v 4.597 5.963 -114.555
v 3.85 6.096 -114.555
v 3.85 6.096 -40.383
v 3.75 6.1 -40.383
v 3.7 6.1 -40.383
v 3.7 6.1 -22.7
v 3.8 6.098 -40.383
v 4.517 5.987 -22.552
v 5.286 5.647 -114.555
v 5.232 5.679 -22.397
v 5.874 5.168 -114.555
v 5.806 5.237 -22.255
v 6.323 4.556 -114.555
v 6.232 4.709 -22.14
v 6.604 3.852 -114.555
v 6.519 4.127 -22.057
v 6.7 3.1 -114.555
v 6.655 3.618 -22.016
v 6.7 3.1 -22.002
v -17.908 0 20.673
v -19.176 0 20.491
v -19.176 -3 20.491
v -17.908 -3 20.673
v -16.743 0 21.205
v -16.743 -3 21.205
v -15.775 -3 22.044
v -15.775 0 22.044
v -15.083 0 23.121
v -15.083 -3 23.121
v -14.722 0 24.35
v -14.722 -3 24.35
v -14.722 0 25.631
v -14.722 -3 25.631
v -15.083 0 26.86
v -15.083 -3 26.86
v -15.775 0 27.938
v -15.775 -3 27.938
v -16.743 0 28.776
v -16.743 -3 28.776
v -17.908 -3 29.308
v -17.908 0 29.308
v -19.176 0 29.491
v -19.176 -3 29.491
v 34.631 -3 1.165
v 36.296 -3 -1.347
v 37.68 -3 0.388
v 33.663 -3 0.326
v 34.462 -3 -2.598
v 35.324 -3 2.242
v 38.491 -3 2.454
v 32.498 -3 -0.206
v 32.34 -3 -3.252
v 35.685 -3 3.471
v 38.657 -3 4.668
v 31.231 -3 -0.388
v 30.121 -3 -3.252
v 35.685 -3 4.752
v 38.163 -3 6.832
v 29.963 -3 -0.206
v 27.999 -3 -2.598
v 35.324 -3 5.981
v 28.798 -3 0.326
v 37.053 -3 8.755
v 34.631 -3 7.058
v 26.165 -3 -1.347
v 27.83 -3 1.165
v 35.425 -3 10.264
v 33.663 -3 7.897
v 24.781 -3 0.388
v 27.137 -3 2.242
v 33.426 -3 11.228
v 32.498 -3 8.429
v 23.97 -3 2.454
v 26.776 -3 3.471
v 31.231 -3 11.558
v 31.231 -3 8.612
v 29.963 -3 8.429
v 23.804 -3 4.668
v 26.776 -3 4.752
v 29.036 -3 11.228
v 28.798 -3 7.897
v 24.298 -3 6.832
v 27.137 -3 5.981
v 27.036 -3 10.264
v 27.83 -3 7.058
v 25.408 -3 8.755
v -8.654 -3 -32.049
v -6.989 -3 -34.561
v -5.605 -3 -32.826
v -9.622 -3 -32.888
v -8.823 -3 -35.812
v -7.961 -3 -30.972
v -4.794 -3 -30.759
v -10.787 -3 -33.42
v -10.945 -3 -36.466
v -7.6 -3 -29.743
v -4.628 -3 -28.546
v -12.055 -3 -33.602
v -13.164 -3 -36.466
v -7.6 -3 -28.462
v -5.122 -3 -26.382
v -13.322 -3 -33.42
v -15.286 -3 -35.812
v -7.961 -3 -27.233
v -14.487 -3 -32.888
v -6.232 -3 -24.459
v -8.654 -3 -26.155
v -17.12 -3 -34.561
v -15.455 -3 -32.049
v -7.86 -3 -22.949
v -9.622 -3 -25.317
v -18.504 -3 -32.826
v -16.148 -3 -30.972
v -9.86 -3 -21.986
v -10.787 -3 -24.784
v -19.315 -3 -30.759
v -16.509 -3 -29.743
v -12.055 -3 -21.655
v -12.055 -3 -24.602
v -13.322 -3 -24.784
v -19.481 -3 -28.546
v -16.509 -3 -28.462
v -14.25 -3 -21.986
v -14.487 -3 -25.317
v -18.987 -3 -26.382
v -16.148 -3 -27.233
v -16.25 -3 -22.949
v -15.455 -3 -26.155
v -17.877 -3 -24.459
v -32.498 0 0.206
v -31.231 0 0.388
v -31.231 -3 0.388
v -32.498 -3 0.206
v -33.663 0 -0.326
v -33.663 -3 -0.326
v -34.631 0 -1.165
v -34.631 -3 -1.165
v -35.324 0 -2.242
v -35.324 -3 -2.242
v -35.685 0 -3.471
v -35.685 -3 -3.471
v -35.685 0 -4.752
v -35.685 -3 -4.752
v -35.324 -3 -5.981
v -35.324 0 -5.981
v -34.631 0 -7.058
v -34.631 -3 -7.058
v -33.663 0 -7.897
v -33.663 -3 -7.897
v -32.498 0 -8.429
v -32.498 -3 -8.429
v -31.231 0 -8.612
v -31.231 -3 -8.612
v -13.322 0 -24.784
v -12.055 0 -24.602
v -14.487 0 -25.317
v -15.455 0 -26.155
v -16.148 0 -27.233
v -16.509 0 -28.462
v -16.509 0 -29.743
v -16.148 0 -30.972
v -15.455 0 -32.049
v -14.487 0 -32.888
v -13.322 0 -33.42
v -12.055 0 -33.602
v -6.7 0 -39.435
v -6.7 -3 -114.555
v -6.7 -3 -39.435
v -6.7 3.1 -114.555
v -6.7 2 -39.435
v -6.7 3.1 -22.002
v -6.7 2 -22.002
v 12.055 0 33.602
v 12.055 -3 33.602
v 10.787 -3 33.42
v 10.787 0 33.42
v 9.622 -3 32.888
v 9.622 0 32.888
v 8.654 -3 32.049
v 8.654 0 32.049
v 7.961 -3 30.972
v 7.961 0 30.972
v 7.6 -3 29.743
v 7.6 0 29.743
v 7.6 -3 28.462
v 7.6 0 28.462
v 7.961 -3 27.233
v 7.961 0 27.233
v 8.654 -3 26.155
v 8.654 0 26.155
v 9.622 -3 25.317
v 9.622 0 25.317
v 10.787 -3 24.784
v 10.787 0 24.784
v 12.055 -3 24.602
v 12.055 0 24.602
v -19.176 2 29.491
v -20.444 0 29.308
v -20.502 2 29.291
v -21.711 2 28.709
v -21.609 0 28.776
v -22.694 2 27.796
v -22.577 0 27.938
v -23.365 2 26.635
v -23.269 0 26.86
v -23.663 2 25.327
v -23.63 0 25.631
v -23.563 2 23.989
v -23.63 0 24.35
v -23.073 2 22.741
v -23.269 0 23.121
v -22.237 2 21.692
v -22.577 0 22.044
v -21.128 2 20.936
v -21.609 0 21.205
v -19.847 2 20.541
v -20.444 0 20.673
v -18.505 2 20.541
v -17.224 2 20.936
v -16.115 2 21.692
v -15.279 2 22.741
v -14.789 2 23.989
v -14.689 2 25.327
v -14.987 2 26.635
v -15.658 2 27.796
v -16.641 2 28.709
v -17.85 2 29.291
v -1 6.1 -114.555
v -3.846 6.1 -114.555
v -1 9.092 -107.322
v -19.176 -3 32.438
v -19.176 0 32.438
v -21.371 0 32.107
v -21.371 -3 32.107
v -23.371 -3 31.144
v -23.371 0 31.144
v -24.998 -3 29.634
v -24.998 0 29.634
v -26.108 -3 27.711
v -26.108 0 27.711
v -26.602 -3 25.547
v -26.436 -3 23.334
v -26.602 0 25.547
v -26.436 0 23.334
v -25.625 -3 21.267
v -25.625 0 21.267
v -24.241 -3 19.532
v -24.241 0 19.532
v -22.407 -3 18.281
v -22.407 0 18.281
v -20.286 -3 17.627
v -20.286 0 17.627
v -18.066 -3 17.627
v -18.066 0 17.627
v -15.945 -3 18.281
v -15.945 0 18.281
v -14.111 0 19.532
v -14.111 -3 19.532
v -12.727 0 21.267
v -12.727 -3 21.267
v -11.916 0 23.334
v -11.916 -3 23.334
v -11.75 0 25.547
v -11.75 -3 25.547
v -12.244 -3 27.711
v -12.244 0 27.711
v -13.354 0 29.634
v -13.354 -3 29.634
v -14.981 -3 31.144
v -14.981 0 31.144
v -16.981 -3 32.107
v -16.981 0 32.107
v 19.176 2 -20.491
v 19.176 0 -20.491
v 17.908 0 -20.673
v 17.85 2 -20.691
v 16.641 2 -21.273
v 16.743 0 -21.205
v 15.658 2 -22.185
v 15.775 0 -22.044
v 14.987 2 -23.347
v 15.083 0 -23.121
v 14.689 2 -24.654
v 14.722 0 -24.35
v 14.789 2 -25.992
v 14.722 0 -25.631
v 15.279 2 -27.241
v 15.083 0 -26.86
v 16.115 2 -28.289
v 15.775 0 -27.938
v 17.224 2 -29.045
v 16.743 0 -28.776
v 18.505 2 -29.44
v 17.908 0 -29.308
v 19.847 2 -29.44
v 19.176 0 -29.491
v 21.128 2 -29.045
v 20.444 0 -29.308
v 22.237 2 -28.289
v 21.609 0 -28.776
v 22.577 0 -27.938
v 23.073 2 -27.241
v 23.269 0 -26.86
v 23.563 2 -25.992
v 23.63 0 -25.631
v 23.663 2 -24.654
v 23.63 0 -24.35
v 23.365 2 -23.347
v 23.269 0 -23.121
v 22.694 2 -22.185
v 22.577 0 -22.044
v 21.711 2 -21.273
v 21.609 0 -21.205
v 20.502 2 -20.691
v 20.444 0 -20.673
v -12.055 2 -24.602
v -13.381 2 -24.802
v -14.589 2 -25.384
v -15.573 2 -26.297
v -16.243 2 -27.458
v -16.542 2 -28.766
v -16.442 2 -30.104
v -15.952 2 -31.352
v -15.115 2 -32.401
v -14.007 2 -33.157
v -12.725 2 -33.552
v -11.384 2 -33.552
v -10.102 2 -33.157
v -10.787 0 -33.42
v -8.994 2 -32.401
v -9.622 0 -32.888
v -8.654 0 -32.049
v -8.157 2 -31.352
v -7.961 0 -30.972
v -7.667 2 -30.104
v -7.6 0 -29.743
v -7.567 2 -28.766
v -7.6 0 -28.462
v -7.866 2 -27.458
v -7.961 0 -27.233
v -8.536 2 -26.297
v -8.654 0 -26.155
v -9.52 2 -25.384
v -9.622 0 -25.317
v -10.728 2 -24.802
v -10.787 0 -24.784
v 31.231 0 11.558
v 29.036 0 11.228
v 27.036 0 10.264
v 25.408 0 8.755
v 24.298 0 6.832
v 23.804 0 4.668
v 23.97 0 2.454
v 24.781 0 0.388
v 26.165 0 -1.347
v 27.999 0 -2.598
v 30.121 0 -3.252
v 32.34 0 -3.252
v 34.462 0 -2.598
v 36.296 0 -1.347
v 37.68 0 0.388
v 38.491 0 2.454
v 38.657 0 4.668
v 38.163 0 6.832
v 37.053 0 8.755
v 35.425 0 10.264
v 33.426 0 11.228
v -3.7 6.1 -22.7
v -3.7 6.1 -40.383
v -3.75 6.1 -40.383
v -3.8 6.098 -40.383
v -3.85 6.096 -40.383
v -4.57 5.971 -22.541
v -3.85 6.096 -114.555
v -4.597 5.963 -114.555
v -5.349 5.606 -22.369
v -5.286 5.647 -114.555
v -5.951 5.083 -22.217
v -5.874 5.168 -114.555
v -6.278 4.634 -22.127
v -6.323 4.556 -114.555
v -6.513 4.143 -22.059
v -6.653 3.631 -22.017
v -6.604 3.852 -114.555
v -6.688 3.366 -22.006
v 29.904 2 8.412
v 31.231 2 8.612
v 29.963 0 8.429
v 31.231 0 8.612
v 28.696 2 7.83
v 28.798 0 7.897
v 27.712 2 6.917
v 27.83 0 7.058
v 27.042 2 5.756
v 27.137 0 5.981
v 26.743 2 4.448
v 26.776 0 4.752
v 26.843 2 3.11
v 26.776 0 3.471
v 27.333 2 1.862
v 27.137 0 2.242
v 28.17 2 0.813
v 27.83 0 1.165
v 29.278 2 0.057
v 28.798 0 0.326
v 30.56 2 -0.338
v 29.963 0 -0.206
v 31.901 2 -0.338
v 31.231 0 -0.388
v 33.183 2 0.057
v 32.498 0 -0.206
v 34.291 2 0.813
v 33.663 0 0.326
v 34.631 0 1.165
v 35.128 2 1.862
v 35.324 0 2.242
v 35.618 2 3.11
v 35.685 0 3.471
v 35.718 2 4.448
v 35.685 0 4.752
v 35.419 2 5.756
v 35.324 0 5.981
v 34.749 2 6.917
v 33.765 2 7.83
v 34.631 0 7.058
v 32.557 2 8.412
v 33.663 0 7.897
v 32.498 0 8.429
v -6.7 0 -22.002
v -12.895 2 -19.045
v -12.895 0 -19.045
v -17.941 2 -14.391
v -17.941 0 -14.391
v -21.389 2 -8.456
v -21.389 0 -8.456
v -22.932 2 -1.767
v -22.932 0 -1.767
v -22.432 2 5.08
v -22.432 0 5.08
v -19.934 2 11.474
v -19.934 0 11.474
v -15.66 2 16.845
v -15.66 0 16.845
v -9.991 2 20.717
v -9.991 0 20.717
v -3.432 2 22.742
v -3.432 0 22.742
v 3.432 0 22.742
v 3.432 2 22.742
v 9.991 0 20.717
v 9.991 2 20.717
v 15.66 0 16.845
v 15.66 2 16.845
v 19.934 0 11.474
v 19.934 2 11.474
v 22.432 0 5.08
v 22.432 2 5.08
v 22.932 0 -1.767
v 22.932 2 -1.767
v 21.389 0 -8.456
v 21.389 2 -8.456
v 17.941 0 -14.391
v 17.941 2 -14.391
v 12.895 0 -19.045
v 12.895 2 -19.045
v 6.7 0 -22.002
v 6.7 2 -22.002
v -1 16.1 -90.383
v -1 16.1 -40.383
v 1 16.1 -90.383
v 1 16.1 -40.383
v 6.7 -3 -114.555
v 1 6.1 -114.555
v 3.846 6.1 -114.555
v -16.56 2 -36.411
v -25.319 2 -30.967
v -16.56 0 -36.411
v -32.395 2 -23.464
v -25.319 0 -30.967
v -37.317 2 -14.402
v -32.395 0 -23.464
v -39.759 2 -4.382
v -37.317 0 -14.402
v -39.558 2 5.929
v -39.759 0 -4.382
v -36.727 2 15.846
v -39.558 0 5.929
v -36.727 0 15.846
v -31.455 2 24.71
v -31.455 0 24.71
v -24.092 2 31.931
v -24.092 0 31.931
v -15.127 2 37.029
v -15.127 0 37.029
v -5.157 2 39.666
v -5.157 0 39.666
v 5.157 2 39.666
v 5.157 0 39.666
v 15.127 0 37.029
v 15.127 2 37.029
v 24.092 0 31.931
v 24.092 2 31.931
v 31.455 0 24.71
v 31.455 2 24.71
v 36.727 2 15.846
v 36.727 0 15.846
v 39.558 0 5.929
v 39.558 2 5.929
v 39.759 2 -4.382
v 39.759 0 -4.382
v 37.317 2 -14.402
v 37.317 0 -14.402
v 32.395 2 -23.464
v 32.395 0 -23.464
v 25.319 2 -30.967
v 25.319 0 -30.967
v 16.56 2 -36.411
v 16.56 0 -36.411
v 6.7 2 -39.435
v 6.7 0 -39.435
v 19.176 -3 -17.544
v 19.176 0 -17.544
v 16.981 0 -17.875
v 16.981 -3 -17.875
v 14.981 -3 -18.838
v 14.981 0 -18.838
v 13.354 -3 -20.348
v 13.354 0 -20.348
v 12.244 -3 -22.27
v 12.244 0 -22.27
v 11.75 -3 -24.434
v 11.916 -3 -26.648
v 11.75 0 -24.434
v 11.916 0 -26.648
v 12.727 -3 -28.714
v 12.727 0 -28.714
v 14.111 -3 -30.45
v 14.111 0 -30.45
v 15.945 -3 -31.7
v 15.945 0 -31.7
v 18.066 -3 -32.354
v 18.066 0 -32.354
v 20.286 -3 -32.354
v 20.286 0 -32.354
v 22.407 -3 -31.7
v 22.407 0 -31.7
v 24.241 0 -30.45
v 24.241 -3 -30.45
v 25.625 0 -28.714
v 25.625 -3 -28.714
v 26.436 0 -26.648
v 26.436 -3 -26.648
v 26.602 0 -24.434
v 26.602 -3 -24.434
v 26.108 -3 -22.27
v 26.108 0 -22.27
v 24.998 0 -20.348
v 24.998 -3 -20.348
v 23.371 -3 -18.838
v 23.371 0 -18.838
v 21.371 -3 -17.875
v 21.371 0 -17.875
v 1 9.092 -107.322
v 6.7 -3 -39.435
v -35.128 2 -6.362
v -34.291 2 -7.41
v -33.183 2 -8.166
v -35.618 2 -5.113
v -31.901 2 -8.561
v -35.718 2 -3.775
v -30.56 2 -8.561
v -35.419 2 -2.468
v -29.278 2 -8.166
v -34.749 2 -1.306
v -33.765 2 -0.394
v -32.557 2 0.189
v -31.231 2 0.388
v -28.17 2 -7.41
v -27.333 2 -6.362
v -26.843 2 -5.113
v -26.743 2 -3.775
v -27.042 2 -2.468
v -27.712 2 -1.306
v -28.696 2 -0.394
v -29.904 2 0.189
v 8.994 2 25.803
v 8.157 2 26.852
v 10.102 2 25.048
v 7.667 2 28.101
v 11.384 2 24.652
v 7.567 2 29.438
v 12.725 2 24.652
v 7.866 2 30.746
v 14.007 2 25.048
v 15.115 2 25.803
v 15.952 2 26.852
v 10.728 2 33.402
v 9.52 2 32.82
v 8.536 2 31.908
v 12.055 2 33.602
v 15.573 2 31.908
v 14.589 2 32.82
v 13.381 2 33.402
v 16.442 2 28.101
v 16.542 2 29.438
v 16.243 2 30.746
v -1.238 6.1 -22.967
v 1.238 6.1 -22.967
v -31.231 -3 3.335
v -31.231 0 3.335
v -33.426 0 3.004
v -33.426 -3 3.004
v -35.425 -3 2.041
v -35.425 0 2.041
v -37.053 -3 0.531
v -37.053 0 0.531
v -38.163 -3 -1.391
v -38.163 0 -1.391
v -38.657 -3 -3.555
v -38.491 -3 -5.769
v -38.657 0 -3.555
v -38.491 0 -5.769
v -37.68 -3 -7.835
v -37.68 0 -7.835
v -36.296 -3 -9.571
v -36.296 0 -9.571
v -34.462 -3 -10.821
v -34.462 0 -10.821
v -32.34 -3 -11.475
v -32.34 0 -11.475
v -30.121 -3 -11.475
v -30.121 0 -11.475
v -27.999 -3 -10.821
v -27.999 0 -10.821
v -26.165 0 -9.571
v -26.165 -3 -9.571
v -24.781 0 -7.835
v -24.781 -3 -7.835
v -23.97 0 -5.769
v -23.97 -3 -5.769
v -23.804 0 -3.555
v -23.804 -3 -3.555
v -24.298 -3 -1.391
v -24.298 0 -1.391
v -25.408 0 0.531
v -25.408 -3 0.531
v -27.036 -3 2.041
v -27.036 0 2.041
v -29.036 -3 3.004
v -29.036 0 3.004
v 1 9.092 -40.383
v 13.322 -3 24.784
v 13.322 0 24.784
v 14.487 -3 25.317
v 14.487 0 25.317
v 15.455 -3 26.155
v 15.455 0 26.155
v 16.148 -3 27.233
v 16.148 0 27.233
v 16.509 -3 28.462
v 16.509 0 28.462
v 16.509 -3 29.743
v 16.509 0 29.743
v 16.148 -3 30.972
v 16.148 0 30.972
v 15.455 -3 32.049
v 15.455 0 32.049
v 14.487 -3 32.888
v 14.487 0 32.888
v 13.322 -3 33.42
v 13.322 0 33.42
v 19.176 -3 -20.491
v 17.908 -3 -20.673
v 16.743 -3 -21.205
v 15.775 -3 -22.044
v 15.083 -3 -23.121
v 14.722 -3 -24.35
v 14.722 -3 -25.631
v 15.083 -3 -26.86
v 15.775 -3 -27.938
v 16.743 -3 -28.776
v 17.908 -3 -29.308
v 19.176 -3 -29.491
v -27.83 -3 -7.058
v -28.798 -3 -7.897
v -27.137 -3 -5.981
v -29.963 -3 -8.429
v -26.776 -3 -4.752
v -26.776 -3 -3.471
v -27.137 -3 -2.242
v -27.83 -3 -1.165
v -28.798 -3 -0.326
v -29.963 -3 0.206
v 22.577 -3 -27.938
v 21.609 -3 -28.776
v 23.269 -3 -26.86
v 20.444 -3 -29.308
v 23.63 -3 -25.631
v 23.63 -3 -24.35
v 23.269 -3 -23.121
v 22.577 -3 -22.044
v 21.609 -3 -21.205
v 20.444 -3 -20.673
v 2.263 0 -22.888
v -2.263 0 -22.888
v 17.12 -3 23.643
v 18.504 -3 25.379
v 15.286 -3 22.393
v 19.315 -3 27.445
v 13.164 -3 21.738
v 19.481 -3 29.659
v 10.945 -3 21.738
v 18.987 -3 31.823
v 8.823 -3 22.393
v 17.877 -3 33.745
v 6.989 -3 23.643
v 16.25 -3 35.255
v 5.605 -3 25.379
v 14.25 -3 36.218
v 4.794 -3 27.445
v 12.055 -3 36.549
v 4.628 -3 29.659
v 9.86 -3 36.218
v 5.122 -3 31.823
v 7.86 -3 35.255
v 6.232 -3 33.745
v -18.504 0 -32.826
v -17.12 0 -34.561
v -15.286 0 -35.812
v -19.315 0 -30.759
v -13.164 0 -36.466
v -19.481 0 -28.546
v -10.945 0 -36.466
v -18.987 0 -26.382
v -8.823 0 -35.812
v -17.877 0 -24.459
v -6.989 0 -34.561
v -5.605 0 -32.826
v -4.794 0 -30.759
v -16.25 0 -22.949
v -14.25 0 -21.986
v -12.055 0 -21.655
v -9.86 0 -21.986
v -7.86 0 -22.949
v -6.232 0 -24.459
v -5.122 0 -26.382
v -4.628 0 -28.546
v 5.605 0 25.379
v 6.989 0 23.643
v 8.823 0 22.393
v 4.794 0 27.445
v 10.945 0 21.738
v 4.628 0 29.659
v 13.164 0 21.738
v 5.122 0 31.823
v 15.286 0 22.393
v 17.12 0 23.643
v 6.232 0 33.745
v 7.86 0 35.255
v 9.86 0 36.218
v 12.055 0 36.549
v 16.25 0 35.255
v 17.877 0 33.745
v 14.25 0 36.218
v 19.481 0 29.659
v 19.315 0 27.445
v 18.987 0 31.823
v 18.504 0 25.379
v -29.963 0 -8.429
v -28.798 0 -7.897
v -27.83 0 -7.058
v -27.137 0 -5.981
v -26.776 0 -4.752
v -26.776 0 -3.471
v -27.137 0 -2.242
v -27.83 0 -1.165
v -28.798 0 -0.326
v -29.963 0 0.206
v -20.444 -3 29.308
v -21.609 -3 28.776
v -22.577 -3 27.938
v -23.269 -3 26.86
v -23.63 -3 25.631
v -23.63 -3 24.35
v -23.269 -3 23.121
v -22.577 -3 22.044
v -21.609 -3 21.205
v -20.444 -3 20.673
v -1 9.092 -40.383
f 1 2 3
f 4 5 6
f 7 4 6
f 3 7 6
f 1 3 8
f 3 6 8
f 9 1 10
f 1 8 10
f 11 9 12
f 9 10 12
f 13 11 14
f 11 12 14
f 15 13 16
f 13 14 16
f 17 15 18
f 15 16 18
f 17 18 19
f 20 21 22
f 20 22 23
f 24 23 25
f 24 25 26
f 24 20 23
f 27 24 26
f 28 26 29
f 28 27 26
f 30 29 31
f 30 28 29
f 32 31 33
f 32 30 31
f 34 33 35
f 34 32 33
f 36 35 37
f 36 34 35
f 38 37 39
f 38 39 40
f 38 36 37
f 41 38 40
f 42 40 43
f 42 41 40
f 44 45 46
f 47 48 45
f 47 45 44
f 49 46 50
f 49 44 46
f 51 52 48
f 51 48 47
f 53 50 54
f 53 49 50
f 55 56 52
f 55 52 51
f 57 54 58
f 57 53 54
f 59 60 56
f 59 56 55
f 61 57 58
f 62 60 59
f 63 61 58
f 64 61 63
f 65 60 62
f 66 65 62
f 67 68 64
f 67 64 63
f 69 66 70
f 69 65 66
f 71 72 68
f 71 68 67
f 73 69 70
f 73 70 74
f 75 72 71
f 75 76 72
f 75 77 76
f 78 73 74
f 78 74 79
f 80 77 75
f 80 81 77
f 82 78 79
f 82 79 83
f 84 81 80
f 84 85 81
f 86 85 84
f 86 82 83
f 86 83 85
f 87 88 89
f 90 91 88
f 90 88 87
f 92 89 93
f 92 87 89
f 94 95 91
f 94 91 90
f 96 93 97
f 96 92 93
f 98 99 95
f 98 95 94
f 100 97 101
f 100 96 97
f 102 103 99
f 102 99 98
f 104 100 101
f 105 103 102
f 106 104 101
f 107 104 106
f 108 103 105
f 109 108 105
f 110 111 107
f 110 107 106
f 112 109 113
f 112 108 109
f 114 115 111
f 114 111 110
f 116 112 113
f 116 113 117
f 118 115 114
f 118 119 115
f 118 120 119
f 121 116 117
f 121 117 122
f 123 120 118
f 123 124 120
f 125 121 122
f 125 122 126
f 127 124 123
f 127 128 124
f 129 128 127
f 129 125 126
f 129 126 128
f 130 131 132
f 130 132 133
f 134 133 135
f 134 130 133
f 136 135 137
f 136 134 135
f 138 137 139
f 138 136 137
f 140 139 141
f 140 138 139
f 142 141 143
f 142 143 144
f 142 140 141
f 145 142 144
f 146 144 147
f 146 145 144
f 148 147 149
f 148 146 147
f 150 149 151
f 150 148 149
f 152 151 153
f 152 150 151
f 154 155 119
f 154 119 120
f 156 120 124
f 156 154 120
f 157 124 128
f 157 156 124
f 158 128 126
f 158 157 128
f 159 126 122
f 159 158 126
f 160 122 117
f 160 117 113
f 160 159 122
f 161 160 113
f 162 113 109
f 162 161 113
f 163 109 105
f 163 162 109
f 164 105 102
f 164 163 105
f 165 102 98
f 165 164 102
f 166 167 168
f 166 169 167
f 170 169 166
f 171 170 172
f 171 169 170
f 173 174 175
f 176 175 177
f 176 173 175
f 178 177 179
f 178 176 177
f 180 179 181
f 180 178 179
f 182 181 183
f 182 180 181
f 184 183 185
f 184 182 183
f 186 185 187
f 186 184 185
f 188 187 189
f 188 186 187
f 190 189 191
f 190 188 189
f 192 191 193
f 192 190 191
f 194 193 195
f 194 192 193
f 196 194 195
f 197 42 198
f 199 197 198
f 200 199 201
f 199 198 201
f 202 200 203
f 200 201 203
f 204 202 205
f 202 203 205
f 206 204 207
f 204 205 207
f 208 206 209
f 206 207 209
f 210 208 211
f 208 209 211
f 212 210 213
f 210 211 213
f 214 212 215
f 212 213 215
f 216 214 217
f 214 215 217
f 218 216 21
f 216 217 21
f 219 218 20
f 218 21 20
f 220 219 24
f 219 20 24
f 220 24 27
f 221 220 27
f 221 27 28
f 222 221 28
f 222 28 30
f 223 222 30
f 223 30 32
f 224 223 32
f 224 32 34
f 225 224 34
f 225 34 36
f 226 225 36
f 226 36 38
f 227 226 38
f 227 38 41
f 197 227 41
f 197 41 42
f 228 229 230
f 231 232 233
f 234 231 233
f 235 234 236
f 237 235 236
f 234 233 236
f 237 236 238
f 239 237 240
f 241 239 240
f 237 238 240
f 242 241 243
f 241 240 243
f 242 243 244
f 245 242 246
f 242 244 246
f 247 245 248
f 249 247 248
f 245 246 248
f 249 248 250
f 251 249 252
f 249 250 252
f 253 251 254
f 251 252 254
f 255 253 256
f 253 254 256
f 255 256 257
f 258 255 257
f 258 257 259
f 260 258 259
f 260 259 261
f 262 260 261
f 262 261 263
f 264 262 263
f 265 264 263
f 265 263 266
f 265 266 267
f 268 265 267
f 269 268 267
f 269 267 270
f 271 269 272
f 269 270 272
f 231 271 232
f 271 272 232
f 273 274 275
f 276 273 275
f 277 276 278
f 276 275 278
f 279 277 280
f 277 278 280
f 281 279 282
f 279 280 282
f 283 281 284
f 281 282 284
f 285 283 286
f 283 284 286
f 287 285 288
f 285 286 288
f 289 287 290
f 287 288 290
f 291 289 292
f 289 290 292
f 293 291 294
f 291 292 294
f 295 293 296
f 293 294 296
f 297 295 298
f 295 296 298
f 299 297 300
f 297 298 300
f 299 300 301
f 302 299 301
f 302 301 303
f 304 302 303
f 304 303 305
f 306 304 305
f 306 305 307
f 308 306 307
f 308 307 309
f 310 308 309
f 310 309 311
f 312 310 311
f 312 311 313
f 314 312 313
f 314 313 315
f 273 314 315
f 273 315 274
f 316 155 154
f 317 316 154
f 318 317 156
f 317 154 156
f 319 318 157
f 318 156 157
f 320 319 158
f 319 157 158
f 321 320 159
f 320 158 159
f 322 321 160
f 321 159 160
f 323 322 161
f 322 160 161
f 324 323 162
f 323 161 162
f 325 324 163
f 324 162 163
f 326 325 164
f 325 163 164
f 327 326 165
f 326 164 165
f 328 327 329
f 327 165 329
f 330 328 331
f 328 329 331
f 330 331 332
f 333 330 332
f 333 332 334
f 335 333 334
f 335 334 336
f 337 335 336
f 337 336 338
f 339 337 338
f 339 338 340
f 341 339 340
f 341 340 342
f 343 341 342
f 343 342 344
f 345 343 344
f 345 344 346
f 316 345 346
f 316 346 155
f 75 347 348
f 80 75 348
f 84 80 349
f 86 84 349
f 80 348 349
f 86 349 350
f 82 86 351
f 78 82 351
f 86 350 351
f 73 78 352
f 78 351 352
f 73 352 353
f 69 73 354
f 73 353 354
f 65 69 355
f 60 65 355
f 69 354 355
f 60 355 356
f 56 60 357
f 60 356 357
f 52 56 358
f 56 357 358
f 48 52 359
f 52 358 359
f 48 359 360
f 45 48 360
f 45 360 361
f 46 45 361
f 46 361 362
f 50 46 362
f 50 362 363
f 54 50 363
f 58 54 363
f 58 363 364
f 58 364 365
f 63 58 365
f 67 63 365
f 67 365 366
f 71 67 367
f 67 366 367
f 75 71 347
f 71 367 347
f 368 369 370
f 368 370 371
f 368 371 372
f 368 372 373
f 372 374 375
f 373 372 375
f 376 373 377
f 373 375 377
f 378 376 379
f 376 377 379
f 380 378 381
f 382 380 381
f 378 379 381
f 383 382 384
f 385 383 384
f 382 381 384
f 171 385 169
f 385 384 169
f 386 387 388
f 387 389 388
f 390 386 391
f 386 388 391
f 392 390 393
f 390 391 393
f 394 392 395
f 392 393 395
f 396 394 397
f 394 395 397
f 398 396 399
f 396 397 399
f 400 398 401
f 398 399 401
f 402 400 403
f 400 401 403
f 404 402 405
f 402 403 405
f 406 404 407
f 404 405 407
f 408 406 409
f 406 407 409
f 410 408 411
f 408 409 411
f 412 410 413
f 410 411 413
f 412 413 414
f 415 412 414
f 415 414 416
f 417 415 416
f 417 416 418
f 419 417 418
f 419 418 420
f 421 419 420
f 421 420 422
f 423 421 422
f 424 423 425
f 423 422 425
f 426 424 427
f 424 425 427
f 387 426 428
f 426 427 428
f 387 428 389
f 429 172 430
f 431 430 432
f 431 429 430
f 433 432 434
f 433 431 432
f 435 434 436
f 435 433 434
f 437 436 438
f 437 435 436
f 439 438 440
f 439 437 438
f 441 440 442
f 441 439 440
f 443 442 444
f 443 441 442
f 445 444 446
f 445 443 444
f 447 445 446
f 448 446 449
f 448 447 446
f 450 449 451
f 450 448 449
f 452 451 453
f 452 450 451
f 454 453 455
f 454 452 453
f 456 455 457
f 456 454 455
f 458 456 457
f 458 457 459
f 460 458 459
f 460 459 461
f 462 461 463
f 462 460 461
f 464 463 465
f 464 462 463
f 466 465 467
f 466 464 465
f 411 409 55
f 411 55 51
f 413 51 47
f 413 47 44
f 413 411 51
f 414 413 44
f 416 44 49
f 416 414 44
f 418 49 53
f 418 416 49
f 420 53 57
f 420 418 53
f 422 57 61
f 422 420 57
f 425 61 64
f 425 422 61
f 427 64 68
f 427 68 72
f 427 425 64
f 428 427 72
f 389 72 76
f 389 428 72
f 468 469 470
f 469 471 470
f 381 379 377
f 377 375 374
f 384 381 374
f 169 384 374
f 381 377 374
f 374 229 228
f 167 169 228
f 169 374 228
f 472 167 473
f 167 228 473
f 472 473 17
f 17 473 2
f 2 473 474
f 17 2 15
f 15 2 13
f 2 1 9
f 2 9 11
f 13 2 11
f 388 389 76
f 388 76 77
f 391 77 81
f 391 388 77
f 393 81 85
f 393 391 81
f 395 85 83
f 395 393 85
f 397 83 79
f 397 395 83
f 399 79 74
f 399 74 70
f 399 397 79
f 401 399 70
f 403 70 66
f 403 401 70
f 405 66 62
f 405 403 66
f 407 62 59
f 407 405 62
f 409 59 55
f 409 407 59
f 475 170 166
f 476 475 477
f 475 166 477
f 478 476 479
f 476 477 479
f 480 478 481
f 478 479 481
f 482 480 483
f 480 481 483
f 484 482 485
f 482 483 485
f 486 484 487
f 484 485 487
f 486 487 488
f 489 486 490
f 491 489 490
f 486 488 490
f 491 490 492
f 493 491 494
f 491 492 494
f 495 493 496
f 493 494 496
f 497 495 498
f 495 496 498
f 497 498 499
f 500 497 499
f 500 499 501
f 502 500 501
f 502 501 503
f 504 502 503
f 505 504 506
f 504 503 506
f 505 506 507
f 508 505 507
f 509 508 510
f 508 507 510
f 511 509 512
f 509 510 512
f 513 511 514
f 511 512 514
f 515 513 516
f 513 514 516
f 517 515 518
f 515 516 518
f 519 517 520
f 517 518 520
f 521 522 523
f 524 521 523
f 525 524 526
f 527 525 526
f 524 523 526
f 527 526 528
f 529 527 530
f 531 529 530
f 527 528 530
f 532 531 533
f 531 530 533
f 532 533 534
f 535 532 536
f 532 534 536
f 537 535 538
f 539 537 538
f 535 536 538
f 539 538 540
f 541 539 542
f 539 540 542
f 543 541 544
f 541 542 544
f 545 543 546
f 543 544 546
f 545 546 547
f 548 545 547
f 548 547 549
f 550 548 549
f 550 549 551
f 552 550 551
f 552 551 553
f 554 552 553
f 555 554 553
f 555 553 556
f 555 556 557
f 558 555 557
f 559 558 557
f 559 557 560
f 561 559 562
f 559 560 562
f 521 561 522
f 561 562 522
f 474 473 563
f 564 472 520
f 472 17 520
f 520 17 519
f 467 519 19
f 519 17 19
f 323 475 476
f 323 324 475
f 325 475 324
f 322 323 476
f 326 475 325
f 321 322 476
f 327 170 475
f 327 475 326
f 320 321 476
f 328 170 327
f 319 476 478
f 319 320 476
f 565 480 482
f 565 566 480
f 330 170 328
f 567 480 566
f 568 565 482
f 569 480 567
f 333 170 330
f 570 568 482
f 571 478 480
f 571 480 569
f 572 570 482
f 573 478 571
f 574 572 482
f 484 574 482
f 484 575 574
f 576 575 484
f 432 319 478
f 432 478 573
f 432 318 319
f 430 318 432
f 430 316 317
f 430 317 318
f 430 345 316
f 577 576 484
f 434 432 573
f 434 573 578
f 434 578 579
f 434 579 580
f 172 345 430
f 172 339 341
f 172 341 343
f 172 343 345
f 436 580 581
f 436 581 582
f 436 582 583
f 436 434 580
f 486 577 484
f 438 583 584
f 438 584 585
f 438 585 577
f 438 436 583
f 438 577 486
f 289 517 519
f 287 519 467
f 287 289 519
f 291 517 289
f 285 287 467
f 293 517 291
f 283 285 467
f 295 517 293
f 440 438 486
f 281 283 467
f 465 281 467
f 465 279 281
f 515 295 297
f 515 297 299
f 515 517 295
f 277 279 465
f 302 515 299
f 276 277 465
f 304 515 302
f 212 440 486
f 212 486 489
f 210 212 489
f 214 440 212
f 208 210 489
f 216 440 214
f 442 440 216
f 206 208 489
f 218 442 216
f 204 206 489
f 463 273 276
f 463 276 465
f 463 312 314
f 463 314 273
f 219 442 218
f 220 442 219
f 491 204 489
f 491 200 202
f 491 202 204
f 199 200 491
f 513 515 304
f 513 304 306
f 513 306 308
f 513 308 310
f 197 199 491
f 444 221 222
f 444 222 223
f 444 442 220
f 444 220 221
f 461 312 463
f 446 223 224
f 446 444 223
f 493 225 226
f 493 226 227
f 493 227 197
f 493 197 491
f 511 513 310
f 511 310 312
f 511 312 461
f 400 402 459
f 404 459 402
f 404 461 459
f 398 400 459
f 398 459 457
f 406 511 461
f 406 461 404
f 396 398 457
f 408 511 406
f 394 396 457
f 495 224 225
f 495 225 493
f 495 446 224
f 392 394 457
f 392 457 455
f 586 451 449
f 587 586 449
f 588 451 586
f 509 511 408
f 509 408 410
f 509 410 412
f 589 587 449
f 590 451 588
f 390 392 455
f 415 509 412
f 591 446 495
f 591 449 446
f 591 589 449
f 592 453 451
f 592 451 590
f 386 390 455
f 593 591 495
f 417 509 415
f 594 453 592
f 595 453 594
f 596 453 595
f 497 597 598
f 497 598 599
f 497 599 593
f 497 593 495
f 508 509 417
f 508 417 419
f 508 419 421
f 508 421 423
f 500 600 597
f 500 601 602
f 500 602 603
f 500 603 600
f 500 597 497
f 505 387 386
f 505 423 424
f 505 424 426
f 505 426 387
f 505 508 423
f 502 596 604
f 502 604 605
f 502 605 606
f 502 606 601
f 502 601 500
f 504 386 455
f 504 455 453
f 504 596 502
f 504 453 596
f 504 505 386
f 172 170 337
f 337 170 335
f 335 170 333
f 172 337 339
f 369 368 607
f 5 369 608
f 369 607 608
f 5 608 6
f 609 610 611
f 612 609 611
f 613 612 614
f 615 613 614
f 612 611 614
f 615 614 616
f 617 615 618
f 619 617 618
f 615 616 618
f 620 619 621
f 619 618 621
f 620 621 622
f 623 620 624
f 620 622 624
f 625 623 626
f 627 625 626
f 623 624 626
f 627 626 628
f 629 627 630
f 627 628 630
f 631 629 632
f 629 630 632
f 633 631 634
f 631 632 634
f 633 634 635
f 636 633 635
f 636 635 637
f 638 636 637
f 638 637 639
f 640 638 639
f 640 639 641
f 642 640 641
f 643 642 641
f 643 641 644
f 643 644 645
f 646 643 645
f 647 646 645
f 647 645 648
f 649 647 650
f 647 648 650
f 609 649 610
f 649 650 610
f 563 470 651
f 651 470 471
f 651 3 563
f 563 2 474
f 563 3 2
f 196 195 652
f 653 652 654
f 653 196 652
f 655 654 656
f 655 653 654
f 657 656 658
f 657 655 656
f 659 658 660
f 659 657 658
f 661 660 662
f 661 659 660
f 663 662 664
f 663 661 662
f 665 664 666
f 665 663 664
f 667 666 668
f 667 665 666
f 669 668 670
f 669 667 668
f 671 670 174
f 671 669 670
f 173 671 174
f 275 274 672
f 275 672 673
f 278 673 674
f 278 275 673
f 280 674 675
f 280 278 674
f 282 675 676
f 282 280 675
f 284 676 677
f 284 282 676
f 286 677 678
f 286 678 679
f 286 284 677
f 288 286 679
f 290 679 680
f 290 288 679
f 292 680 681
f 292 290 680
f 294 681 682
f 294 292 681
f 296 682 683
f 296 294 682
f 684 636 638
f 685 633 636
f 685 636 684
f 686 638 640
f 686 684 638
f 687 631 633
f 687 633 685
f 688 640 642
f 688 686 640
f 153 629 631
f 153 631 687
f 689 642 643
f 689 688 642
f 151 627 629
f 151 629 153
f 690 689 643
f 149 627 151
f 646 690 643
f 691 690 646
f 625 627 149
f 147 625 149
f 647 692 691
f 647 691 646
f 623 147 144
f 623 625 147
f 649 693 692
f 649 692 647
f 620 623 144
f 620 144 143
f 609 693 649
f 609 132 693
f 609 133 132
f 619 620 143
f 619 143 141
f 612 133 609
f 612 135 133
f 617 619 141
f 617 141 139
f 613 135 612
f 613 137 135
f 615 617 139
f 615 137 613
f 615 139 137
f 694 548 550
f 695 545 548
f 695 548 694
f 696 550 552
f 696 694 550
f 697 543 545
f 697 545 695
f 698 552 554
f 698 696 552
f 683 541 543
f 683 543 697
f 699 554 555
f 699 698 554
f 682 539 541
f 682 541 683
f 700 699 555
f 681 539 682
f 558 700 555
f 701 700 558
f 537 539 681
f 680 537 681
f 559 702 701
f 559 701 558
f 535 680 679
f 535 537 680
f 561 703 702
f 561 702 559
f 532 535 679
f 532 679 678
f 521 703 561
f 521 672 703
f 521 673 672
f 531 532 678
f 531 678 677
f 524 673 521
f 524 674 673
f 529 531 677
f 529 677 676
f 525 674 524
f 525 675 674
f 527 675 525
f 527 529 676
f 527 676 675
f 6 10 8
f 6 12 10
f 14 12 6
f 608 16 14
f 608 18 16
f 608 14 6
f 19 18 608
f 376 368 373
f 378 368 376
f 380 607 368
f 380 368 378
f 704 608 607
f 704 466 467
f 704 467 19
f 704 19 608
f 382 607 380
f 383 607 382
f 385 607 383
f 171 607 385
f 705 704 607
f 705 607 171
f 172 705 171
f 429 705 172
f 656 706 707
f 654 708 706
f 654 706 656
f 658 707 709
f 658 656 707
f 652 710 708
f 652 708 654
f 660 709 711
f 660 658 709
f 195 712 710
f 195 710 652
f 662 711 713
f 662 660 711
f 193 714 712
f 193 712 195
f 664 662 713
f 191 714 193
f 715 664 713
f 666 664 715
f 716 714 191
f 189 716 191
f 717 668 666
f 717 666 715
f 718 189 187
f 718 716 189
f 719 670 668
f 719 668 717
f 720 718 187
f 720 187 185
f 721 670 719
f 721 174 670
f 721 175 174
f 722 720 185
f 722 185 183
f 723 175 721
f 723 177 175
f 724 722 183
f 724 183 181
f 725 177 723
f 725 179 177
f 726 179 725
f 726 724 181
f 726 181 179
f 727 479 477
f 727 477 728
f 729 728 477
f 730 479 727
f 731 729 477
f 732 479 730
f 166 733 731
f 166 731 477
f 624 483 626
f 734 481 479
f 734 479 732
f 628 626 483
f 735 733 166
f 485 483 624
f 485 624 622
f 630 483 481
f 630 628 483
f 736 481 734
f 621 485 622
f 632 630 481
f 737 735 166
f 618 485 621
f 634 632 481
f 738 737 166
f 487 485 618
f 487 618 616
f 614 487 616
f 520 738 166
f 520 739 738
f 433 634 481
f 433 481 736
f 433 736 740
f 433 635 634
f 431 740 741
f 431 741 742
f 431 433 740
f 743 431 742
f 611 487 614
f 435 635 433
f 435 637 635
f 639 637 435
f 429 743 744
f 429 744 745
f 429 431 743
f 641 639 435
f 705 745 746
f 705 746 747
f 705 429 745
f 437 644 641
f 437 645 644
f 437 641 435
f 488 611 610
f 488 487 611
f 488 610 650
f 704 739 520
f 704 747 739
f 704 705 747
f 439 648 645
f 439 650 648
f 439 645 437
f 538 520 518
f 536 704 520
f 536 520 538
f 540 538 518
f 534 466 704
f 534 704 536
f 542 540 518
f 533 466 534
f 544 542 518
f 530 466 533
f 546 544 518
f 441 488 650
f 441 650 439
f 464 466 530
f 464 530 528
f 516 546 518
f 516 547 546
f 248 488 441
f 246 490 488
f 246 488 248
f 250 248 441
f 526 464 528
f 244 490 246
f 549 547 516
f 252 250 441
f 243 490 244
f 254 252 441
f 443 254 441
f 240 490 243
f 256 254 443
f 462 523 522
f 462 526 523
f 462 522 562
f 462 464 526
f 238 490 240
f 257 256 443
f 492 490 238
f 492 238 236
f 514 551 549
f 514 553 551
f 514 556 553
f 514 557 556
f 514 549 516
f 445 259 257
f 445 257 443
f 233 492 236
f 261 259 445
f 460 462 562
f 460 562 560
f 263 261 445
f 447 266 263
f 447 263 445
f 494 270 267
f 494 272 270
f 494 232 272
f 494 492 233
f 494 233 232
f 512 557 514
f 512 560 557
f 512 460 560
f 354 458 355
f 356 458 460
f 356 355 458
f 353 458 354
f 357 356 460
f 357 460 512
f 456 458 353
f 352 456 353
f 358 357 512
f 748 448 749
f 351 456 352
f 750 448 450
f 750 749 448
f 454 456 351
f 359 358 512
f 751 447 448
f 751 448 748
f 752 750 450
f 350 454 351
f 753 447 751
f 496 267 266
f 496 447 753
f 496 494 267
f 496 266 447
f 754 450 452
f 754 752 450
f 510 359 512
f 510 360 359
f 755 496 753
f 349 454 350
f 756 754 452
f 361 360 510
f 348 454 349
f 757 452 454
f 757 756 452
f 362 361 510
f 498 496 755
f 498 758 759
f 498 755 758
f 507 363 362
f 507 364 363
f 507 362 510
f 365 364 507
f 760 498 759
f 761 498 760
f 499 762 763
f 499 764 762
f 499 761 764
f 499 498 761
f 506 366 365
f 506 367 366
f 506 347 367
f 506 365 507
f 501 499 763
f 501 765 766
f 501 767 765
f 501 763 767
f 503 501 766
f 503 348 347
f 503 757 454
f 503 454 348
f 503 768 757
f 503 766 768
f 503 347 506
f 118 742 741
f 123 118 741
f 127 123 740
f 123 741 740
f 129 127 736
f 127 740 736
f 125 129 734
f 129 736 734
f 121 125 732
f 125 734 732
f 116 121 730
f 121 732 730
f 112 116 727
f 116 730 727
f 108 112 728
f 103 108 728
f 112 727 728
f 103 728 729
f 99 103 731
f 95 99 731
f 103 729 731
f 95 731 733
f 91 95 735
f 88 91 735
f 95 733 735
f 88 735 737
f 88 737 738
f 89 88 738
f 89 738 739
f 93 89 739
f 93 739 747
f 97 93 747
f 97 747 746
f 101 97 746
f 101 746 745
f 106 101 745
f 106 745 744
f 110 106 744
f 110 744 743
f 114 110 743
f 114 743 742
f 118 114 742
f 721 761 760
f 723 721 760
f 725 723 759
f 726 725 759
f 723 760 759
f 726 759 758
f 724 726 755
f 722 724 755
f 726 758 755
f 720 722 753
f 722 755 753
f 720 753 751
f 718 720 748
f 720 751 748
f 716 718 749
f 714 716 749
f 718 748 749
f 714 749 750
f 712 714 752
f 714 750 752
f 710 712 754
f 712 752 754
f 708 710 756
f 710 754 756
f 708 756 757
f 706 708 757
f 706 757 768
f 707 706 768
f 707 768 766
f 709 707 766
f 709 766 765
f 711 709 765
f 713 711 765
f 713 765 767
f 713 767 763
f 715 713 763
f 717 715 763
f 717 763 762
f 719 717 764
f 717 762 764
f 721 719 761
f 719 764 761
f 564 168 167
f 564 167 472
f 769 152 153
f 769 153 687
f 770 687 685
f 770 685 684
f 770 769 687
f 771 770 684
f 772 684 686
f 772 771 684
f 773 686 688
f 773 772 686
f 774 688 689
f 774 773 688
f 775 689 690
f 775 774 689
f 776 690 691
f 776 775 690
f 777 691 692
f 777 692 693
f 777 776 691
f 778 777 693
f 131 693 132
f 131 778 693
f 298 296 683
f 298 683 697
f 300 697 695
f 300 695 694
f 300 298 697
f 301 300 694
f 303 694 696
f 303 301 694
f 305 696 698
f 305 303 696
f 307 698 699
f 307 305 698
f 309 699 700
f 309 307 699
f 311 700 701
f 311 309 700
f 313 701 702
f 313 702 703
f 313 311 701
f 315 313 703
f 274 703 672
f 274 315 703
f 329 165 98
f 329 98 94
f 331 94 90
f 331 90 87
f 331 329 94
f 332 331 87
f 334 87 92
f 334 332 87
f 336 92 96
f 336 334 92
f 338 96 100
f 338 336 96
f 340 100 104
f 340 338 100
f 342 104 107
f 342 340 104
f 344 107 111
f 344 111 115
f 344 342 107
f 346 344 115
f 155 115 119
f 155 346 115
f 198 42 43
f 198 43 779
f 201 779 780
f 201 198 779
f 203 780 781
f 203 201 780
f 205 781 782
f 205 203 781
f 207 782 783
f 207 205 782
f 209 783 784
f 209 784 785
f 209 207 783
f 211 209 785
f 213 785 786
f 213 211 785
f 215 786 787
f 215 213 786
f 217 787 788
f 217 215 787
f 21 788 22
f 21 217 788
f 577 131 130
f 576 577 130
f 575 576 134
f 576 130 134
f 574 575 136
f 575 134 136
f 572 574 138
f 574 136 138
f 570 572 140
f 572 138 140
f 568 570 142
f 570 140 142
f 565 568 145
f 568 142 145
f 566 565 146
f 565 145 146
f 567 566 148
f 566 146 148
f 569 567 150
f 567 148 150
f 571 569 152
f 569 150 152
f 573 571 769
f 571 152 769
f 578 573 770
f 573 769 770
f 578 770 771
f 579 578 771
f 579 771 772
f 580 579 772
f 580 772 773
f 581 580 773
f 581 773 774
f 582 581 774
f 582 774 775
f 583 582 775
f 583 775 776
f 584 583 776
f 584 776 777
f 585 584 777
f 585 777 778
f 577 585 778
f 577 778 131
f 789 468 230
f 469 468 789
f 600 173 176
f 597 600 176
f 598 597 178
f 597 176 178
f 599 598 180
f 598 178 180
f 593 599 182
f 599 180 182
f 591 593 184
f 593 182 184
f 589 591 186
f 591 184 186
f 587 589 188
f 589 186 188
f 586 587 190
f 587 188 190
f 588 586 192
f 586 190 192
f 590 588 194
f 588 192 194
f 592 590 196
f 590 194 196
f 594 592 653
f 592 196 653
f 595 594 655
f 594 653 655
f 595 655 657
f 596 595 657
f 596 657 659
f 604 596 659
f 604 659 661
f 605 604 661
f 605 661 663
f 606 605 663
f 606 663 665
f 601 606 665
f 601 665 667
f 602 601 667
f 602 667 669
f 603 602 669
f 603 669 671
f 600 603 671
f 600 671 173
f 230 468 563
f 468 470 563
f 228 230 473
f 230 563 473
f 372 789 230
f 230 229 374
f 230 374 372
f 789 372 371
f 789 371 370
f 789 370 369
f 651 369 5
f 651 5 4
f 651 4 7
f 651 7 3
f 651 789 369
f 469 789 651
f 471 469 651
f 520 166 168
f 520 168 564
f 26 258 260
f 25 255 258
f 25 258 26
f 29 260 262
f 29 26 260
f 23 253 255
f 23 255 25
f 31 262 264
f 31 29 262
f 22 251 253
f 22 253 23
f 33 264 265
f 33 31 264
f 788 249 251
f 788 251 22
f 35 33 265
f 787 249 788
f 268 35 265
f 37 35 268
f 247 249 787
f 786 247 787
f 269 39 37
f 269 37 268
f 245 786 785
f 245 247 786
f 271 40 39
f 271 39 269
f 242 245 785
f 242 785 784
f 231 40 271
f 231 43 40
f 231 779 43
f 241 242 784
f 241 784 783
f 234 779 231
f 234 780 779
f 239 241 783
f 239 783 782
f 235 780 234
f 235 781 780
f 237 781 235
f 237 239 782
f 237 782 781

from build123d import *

# Parameters (mm, degrees)
SKETCH1_R            = 40
SKETCH1_R_2          = 23
BOSS_EXTRUDE1_DEPTH  = 2
SKETCH2_R            = 7.446883929
SKETCH2_R_2          = 4.5
BOSS_EXTRUDE2_DEPTH  = 3
BOSS_EXTRUDE3_DEPTH  = 6.1
FILLET1_R            = 3
BOSS_EXTRUDE4_DEPTH  = 1
CHAMFER1_START       = -114.555494515
CHAMFER1_DEPTH       = 74.172546458
CHAMFER1_START_2     = 49.428104725
CHAMFER1_2_OUTLINE_W = 3
CHAMFER1_2_OUTLINE_H = 11
CHAMFER1_2_DEPTH     = 3.571895275
SKETCH6_R            = 4.5
CUT_EXTRUDE1_DEPTH   = 6
SKETCH7_W            = 13.4
SKETCH7_H            = 75.12061148
BOSS_EXTRUDE5_DEPTH  = 3


with BuildPart() as part:
    # Sketch1 → Boss-Extrude1 (new body)
    with BuildSketch(Plane(origin=(0, 0, 0), x_dir=(1, 0, 0), z_dir=(0, 1, 0))):
        with Locations(Location((0, 0, 0), (0, 0, 270))):
            Circle(SKETCH1_R)
        with Locations(Location((0, 0, 0), (0, 0, 270))):
            Circle(SKETCH1_R_2, mode=Mode.SUBTRACT)
    extrude(amount=BOSS_EXTRUDE1_DEPTH)

    # Sketch2 → Boss-Extrude2 (add)
    # profile 1 of 6: a face of its own
    with BuildSketch(Plane.XZ):
        with Locations(Location((12.054528119, 29.102205274, 0), (0, 0, 90))):
            Circle(SKETCH2_R)
        with Locations(Location((12.054528119, 29.102205274, 0), (0, 0, 270))):
            Circle(SKETCH2_R_2, mode=Mode.SUBTRACT)
    # profile 2 of 6: a face of its own
    with BuildSketch(Plane.XZ):
        with Locations(Location((-19.175985014, 24.990630219, 0), (0, 0, 90))):
            Circle(SKETCH2_R)
        with Locations(Location((-19.175985014, 24.990630219, 0), (0, 0, 270))):
            Circle(SKETCH2_R_2, mode=Mode.SUBTRACT)
    # profile 3 of 6: a face of its own
    with BuildSketch(Plane.XZ):
        with Locations(Location((31.230513133, 4.111575055, 0), (0, 0, 90))):
            Circle(SKETCH2_R)
        with Locations(Location((31.230513133, 4.111575055, 0), (0, 0, 270))):
            Circle(SKETCH2_R_2, mode=Mode.SUBTRACT)
    # profile 4 of 6: a face of its own
    with BuildSketch(Plane.XZ):
        with Locations(Location((19.175985014, -24.990630219, 0), (0, 0, 90))):
            Circle(SKETCH2_R)
        with Locations(Location((19.175985014, -24.990630219, 0), (0, 0, 270))):
            Circle(SKETCH2_R_2, mode=Mode.SUBTRACT)
    # profile 5 of 6: a face of its own
    with BuildSketch(Plane.XZ):
        with Locations(Location((-12.05452812, -29.102205274, 0), (0, 0, 90))):
            Circle(SKETCH2_R)
        with Locations(Location((-12.05452812, -29.102205274, 0), (0, 0, 270))):
            Circle(SKETCH2_R_2, mode=Mode.SUBTRACT)
    # profile 6 of 6: a face of its own
    with BuildSketch(Plane.XZ):
        with Locations(Location((-31.230513133, -4.111575055, 0), (0, 0, 90))):
            Circle(SKETCH2_R)
        with Locations(Location((-31.230513133, -4.111575055, 0), (0, 0, 270))):
            Circle(SKETCH2_R_2, mode=Mode.SUBTRACT)
    extrude(amount=BOSS_EXTRUDE2_DEPTH)

    # Sketch3 → Boss-Extrude3 (add)
    with BuildSketch(Plane.XZ):
        with BuildLine():
            Line((-6.7, -87.315801531), (-6.7, -114.555494515))
            Line((-6.7, -114.555494515), (6.7, -114.555494515))
            Line((6.7, -114.555494515), (6.7, -87.315801531))
            Line((6.7, -87.315801531), (6.7, -37.501560575))
            Line((6.7, -37.501560575), (6.7, -22.002499858))
            ThreePointArc((6.7, -22.002499858), (0, -23), (-6.7, -22.002499858))
            Line((-6.7, -22.002499858), (-6.7, -37.501560575))
            Line((-6.7, -37.501560575), (-6.7, -87.315801531))
        make_face()
    extrude(amount=-BOSS_EXTRUDE3_DEPTH)

    # Fillet1
    fillet1_edges = [part.edges().sort_by_distance(p)[0] for p in [
        (6.7, 6.1, -68.278997186),
        (-6.7, 6.1, -68.278997186),
    ]]
    fillet(fillet1_edges, radius=FILLET1_R)

    # Sketch5 → Boss-Extrude4 (add, symmetric)
    with BuildSketch(Plane(origin=(0, 0, 0), x_dir=(0, 0, -1), z_dir=(1, 0, 0))):
        Polygon((40.382948057, 6.1), (40.382948057, 16.1), (90.382948057, 16.1), (114.555494515, 6.1), align=None)
    extrude(amount=BOSS_EXTRUDE4_DEPTH, both=True)

    # Chamfer1: read off the stored shape, not the designer's step
    # Chamfer1 outline → Chamfer1 (add)
    with BuildSketch(Plane.XY.offset(CHAMFER1_START)):
        with BuildLine():
            Line((-1, 6.1), (-1, 9.092495307))
            Line((-1, 9.092495307), (-3.85, 6.096247653))
            ThreePointArc((-3.85, 6.096247653), (-3.775023463, 6.099061767), (-3.7, 6.1))
            Line((-3.7, 6.1), (-1, 6.1))
        make_face()
        with BuildLine():
            Line((1, 9.092495307), (1, 6.1))
            Line((1, 6.1), (3.7, 6.1))
            ThreePointArc((3.7, 6.1), (3.775023463, 6.099061767), (3.85, 6.096247653))
            Line((3.85, 6.096247653), (1, 9.092495307))
        make_face()
    extrude(amount=CHAMFER1_DEPTH)

    # Chamfer1 2 outline → Chamfer1 2 (cut)
    with BuildSketch(Plane(origin=(0, 0, 0), x_dir=(1, 0, 0), z_dir=(0, 0.924049688522023, -0.382272380825966)).offset(CHAMFER1_START_2)):
        with Locations((2.5, 99.5)):
            Rectangle(CHAMFER1_2_OUTLINE_W, CHAMFER1_2_OUTLINE_H)
        with Locations((-2.5, 99.5)):
            Rectangle(CHAMFER1_2_OUTLINE_W, CHAMFER1_2_OUTLINE_H)
    extrude(amount=CHAMFER1_2_DEPTH, mode=Mode.SUBTRACT)

    # Sketch6 → Cut-Extrude1 (cut, symmetric)
    with BuildSketch(Plane.XZ):
        with Locations(Location((19.175985014, -24.990630219, 0), (0, 0, 90))):
            Circle(SKETCH6_R)
        with Locations(Location((-12.05452812, -29.102205274, 0), (0, 0, 90))):
            Circle(SKETCH6_R)
        with Locations(Location((-31.230513133, -4.111575055, 0), (0, 0, 90))):
            Circle(SKETCH6_R)
        with Locations(Location((-19.175985014, 24.990630219, 0), (0, 0, 90))):
            Circle(SKETCH6_R)
        with Locations(Location((12.05452812, 29.102205274, 0), (0, 0, 90))):
            Circle(SKETCH6_R)
        with Locations(Location((31.230513133, 4.111575055, 0), (0, 0, 90))):
            Circle(SKETCH6_R)
    extrude(amount=CUT_EXTRUDE1_DEPTH, both=True, mode=Mode.SUBTRACT)

    # Sketch7 → Boss-Extrude5 (add)
    with BuildSketch(Plane.XZ):
        with Locations((0, -76.995188775)):
            Rectangle(SKETCH7_W, SKETCH7_H)
    extrude(amount=BOSS_EXTRUDE5_DEPTH)


solid = part.part
